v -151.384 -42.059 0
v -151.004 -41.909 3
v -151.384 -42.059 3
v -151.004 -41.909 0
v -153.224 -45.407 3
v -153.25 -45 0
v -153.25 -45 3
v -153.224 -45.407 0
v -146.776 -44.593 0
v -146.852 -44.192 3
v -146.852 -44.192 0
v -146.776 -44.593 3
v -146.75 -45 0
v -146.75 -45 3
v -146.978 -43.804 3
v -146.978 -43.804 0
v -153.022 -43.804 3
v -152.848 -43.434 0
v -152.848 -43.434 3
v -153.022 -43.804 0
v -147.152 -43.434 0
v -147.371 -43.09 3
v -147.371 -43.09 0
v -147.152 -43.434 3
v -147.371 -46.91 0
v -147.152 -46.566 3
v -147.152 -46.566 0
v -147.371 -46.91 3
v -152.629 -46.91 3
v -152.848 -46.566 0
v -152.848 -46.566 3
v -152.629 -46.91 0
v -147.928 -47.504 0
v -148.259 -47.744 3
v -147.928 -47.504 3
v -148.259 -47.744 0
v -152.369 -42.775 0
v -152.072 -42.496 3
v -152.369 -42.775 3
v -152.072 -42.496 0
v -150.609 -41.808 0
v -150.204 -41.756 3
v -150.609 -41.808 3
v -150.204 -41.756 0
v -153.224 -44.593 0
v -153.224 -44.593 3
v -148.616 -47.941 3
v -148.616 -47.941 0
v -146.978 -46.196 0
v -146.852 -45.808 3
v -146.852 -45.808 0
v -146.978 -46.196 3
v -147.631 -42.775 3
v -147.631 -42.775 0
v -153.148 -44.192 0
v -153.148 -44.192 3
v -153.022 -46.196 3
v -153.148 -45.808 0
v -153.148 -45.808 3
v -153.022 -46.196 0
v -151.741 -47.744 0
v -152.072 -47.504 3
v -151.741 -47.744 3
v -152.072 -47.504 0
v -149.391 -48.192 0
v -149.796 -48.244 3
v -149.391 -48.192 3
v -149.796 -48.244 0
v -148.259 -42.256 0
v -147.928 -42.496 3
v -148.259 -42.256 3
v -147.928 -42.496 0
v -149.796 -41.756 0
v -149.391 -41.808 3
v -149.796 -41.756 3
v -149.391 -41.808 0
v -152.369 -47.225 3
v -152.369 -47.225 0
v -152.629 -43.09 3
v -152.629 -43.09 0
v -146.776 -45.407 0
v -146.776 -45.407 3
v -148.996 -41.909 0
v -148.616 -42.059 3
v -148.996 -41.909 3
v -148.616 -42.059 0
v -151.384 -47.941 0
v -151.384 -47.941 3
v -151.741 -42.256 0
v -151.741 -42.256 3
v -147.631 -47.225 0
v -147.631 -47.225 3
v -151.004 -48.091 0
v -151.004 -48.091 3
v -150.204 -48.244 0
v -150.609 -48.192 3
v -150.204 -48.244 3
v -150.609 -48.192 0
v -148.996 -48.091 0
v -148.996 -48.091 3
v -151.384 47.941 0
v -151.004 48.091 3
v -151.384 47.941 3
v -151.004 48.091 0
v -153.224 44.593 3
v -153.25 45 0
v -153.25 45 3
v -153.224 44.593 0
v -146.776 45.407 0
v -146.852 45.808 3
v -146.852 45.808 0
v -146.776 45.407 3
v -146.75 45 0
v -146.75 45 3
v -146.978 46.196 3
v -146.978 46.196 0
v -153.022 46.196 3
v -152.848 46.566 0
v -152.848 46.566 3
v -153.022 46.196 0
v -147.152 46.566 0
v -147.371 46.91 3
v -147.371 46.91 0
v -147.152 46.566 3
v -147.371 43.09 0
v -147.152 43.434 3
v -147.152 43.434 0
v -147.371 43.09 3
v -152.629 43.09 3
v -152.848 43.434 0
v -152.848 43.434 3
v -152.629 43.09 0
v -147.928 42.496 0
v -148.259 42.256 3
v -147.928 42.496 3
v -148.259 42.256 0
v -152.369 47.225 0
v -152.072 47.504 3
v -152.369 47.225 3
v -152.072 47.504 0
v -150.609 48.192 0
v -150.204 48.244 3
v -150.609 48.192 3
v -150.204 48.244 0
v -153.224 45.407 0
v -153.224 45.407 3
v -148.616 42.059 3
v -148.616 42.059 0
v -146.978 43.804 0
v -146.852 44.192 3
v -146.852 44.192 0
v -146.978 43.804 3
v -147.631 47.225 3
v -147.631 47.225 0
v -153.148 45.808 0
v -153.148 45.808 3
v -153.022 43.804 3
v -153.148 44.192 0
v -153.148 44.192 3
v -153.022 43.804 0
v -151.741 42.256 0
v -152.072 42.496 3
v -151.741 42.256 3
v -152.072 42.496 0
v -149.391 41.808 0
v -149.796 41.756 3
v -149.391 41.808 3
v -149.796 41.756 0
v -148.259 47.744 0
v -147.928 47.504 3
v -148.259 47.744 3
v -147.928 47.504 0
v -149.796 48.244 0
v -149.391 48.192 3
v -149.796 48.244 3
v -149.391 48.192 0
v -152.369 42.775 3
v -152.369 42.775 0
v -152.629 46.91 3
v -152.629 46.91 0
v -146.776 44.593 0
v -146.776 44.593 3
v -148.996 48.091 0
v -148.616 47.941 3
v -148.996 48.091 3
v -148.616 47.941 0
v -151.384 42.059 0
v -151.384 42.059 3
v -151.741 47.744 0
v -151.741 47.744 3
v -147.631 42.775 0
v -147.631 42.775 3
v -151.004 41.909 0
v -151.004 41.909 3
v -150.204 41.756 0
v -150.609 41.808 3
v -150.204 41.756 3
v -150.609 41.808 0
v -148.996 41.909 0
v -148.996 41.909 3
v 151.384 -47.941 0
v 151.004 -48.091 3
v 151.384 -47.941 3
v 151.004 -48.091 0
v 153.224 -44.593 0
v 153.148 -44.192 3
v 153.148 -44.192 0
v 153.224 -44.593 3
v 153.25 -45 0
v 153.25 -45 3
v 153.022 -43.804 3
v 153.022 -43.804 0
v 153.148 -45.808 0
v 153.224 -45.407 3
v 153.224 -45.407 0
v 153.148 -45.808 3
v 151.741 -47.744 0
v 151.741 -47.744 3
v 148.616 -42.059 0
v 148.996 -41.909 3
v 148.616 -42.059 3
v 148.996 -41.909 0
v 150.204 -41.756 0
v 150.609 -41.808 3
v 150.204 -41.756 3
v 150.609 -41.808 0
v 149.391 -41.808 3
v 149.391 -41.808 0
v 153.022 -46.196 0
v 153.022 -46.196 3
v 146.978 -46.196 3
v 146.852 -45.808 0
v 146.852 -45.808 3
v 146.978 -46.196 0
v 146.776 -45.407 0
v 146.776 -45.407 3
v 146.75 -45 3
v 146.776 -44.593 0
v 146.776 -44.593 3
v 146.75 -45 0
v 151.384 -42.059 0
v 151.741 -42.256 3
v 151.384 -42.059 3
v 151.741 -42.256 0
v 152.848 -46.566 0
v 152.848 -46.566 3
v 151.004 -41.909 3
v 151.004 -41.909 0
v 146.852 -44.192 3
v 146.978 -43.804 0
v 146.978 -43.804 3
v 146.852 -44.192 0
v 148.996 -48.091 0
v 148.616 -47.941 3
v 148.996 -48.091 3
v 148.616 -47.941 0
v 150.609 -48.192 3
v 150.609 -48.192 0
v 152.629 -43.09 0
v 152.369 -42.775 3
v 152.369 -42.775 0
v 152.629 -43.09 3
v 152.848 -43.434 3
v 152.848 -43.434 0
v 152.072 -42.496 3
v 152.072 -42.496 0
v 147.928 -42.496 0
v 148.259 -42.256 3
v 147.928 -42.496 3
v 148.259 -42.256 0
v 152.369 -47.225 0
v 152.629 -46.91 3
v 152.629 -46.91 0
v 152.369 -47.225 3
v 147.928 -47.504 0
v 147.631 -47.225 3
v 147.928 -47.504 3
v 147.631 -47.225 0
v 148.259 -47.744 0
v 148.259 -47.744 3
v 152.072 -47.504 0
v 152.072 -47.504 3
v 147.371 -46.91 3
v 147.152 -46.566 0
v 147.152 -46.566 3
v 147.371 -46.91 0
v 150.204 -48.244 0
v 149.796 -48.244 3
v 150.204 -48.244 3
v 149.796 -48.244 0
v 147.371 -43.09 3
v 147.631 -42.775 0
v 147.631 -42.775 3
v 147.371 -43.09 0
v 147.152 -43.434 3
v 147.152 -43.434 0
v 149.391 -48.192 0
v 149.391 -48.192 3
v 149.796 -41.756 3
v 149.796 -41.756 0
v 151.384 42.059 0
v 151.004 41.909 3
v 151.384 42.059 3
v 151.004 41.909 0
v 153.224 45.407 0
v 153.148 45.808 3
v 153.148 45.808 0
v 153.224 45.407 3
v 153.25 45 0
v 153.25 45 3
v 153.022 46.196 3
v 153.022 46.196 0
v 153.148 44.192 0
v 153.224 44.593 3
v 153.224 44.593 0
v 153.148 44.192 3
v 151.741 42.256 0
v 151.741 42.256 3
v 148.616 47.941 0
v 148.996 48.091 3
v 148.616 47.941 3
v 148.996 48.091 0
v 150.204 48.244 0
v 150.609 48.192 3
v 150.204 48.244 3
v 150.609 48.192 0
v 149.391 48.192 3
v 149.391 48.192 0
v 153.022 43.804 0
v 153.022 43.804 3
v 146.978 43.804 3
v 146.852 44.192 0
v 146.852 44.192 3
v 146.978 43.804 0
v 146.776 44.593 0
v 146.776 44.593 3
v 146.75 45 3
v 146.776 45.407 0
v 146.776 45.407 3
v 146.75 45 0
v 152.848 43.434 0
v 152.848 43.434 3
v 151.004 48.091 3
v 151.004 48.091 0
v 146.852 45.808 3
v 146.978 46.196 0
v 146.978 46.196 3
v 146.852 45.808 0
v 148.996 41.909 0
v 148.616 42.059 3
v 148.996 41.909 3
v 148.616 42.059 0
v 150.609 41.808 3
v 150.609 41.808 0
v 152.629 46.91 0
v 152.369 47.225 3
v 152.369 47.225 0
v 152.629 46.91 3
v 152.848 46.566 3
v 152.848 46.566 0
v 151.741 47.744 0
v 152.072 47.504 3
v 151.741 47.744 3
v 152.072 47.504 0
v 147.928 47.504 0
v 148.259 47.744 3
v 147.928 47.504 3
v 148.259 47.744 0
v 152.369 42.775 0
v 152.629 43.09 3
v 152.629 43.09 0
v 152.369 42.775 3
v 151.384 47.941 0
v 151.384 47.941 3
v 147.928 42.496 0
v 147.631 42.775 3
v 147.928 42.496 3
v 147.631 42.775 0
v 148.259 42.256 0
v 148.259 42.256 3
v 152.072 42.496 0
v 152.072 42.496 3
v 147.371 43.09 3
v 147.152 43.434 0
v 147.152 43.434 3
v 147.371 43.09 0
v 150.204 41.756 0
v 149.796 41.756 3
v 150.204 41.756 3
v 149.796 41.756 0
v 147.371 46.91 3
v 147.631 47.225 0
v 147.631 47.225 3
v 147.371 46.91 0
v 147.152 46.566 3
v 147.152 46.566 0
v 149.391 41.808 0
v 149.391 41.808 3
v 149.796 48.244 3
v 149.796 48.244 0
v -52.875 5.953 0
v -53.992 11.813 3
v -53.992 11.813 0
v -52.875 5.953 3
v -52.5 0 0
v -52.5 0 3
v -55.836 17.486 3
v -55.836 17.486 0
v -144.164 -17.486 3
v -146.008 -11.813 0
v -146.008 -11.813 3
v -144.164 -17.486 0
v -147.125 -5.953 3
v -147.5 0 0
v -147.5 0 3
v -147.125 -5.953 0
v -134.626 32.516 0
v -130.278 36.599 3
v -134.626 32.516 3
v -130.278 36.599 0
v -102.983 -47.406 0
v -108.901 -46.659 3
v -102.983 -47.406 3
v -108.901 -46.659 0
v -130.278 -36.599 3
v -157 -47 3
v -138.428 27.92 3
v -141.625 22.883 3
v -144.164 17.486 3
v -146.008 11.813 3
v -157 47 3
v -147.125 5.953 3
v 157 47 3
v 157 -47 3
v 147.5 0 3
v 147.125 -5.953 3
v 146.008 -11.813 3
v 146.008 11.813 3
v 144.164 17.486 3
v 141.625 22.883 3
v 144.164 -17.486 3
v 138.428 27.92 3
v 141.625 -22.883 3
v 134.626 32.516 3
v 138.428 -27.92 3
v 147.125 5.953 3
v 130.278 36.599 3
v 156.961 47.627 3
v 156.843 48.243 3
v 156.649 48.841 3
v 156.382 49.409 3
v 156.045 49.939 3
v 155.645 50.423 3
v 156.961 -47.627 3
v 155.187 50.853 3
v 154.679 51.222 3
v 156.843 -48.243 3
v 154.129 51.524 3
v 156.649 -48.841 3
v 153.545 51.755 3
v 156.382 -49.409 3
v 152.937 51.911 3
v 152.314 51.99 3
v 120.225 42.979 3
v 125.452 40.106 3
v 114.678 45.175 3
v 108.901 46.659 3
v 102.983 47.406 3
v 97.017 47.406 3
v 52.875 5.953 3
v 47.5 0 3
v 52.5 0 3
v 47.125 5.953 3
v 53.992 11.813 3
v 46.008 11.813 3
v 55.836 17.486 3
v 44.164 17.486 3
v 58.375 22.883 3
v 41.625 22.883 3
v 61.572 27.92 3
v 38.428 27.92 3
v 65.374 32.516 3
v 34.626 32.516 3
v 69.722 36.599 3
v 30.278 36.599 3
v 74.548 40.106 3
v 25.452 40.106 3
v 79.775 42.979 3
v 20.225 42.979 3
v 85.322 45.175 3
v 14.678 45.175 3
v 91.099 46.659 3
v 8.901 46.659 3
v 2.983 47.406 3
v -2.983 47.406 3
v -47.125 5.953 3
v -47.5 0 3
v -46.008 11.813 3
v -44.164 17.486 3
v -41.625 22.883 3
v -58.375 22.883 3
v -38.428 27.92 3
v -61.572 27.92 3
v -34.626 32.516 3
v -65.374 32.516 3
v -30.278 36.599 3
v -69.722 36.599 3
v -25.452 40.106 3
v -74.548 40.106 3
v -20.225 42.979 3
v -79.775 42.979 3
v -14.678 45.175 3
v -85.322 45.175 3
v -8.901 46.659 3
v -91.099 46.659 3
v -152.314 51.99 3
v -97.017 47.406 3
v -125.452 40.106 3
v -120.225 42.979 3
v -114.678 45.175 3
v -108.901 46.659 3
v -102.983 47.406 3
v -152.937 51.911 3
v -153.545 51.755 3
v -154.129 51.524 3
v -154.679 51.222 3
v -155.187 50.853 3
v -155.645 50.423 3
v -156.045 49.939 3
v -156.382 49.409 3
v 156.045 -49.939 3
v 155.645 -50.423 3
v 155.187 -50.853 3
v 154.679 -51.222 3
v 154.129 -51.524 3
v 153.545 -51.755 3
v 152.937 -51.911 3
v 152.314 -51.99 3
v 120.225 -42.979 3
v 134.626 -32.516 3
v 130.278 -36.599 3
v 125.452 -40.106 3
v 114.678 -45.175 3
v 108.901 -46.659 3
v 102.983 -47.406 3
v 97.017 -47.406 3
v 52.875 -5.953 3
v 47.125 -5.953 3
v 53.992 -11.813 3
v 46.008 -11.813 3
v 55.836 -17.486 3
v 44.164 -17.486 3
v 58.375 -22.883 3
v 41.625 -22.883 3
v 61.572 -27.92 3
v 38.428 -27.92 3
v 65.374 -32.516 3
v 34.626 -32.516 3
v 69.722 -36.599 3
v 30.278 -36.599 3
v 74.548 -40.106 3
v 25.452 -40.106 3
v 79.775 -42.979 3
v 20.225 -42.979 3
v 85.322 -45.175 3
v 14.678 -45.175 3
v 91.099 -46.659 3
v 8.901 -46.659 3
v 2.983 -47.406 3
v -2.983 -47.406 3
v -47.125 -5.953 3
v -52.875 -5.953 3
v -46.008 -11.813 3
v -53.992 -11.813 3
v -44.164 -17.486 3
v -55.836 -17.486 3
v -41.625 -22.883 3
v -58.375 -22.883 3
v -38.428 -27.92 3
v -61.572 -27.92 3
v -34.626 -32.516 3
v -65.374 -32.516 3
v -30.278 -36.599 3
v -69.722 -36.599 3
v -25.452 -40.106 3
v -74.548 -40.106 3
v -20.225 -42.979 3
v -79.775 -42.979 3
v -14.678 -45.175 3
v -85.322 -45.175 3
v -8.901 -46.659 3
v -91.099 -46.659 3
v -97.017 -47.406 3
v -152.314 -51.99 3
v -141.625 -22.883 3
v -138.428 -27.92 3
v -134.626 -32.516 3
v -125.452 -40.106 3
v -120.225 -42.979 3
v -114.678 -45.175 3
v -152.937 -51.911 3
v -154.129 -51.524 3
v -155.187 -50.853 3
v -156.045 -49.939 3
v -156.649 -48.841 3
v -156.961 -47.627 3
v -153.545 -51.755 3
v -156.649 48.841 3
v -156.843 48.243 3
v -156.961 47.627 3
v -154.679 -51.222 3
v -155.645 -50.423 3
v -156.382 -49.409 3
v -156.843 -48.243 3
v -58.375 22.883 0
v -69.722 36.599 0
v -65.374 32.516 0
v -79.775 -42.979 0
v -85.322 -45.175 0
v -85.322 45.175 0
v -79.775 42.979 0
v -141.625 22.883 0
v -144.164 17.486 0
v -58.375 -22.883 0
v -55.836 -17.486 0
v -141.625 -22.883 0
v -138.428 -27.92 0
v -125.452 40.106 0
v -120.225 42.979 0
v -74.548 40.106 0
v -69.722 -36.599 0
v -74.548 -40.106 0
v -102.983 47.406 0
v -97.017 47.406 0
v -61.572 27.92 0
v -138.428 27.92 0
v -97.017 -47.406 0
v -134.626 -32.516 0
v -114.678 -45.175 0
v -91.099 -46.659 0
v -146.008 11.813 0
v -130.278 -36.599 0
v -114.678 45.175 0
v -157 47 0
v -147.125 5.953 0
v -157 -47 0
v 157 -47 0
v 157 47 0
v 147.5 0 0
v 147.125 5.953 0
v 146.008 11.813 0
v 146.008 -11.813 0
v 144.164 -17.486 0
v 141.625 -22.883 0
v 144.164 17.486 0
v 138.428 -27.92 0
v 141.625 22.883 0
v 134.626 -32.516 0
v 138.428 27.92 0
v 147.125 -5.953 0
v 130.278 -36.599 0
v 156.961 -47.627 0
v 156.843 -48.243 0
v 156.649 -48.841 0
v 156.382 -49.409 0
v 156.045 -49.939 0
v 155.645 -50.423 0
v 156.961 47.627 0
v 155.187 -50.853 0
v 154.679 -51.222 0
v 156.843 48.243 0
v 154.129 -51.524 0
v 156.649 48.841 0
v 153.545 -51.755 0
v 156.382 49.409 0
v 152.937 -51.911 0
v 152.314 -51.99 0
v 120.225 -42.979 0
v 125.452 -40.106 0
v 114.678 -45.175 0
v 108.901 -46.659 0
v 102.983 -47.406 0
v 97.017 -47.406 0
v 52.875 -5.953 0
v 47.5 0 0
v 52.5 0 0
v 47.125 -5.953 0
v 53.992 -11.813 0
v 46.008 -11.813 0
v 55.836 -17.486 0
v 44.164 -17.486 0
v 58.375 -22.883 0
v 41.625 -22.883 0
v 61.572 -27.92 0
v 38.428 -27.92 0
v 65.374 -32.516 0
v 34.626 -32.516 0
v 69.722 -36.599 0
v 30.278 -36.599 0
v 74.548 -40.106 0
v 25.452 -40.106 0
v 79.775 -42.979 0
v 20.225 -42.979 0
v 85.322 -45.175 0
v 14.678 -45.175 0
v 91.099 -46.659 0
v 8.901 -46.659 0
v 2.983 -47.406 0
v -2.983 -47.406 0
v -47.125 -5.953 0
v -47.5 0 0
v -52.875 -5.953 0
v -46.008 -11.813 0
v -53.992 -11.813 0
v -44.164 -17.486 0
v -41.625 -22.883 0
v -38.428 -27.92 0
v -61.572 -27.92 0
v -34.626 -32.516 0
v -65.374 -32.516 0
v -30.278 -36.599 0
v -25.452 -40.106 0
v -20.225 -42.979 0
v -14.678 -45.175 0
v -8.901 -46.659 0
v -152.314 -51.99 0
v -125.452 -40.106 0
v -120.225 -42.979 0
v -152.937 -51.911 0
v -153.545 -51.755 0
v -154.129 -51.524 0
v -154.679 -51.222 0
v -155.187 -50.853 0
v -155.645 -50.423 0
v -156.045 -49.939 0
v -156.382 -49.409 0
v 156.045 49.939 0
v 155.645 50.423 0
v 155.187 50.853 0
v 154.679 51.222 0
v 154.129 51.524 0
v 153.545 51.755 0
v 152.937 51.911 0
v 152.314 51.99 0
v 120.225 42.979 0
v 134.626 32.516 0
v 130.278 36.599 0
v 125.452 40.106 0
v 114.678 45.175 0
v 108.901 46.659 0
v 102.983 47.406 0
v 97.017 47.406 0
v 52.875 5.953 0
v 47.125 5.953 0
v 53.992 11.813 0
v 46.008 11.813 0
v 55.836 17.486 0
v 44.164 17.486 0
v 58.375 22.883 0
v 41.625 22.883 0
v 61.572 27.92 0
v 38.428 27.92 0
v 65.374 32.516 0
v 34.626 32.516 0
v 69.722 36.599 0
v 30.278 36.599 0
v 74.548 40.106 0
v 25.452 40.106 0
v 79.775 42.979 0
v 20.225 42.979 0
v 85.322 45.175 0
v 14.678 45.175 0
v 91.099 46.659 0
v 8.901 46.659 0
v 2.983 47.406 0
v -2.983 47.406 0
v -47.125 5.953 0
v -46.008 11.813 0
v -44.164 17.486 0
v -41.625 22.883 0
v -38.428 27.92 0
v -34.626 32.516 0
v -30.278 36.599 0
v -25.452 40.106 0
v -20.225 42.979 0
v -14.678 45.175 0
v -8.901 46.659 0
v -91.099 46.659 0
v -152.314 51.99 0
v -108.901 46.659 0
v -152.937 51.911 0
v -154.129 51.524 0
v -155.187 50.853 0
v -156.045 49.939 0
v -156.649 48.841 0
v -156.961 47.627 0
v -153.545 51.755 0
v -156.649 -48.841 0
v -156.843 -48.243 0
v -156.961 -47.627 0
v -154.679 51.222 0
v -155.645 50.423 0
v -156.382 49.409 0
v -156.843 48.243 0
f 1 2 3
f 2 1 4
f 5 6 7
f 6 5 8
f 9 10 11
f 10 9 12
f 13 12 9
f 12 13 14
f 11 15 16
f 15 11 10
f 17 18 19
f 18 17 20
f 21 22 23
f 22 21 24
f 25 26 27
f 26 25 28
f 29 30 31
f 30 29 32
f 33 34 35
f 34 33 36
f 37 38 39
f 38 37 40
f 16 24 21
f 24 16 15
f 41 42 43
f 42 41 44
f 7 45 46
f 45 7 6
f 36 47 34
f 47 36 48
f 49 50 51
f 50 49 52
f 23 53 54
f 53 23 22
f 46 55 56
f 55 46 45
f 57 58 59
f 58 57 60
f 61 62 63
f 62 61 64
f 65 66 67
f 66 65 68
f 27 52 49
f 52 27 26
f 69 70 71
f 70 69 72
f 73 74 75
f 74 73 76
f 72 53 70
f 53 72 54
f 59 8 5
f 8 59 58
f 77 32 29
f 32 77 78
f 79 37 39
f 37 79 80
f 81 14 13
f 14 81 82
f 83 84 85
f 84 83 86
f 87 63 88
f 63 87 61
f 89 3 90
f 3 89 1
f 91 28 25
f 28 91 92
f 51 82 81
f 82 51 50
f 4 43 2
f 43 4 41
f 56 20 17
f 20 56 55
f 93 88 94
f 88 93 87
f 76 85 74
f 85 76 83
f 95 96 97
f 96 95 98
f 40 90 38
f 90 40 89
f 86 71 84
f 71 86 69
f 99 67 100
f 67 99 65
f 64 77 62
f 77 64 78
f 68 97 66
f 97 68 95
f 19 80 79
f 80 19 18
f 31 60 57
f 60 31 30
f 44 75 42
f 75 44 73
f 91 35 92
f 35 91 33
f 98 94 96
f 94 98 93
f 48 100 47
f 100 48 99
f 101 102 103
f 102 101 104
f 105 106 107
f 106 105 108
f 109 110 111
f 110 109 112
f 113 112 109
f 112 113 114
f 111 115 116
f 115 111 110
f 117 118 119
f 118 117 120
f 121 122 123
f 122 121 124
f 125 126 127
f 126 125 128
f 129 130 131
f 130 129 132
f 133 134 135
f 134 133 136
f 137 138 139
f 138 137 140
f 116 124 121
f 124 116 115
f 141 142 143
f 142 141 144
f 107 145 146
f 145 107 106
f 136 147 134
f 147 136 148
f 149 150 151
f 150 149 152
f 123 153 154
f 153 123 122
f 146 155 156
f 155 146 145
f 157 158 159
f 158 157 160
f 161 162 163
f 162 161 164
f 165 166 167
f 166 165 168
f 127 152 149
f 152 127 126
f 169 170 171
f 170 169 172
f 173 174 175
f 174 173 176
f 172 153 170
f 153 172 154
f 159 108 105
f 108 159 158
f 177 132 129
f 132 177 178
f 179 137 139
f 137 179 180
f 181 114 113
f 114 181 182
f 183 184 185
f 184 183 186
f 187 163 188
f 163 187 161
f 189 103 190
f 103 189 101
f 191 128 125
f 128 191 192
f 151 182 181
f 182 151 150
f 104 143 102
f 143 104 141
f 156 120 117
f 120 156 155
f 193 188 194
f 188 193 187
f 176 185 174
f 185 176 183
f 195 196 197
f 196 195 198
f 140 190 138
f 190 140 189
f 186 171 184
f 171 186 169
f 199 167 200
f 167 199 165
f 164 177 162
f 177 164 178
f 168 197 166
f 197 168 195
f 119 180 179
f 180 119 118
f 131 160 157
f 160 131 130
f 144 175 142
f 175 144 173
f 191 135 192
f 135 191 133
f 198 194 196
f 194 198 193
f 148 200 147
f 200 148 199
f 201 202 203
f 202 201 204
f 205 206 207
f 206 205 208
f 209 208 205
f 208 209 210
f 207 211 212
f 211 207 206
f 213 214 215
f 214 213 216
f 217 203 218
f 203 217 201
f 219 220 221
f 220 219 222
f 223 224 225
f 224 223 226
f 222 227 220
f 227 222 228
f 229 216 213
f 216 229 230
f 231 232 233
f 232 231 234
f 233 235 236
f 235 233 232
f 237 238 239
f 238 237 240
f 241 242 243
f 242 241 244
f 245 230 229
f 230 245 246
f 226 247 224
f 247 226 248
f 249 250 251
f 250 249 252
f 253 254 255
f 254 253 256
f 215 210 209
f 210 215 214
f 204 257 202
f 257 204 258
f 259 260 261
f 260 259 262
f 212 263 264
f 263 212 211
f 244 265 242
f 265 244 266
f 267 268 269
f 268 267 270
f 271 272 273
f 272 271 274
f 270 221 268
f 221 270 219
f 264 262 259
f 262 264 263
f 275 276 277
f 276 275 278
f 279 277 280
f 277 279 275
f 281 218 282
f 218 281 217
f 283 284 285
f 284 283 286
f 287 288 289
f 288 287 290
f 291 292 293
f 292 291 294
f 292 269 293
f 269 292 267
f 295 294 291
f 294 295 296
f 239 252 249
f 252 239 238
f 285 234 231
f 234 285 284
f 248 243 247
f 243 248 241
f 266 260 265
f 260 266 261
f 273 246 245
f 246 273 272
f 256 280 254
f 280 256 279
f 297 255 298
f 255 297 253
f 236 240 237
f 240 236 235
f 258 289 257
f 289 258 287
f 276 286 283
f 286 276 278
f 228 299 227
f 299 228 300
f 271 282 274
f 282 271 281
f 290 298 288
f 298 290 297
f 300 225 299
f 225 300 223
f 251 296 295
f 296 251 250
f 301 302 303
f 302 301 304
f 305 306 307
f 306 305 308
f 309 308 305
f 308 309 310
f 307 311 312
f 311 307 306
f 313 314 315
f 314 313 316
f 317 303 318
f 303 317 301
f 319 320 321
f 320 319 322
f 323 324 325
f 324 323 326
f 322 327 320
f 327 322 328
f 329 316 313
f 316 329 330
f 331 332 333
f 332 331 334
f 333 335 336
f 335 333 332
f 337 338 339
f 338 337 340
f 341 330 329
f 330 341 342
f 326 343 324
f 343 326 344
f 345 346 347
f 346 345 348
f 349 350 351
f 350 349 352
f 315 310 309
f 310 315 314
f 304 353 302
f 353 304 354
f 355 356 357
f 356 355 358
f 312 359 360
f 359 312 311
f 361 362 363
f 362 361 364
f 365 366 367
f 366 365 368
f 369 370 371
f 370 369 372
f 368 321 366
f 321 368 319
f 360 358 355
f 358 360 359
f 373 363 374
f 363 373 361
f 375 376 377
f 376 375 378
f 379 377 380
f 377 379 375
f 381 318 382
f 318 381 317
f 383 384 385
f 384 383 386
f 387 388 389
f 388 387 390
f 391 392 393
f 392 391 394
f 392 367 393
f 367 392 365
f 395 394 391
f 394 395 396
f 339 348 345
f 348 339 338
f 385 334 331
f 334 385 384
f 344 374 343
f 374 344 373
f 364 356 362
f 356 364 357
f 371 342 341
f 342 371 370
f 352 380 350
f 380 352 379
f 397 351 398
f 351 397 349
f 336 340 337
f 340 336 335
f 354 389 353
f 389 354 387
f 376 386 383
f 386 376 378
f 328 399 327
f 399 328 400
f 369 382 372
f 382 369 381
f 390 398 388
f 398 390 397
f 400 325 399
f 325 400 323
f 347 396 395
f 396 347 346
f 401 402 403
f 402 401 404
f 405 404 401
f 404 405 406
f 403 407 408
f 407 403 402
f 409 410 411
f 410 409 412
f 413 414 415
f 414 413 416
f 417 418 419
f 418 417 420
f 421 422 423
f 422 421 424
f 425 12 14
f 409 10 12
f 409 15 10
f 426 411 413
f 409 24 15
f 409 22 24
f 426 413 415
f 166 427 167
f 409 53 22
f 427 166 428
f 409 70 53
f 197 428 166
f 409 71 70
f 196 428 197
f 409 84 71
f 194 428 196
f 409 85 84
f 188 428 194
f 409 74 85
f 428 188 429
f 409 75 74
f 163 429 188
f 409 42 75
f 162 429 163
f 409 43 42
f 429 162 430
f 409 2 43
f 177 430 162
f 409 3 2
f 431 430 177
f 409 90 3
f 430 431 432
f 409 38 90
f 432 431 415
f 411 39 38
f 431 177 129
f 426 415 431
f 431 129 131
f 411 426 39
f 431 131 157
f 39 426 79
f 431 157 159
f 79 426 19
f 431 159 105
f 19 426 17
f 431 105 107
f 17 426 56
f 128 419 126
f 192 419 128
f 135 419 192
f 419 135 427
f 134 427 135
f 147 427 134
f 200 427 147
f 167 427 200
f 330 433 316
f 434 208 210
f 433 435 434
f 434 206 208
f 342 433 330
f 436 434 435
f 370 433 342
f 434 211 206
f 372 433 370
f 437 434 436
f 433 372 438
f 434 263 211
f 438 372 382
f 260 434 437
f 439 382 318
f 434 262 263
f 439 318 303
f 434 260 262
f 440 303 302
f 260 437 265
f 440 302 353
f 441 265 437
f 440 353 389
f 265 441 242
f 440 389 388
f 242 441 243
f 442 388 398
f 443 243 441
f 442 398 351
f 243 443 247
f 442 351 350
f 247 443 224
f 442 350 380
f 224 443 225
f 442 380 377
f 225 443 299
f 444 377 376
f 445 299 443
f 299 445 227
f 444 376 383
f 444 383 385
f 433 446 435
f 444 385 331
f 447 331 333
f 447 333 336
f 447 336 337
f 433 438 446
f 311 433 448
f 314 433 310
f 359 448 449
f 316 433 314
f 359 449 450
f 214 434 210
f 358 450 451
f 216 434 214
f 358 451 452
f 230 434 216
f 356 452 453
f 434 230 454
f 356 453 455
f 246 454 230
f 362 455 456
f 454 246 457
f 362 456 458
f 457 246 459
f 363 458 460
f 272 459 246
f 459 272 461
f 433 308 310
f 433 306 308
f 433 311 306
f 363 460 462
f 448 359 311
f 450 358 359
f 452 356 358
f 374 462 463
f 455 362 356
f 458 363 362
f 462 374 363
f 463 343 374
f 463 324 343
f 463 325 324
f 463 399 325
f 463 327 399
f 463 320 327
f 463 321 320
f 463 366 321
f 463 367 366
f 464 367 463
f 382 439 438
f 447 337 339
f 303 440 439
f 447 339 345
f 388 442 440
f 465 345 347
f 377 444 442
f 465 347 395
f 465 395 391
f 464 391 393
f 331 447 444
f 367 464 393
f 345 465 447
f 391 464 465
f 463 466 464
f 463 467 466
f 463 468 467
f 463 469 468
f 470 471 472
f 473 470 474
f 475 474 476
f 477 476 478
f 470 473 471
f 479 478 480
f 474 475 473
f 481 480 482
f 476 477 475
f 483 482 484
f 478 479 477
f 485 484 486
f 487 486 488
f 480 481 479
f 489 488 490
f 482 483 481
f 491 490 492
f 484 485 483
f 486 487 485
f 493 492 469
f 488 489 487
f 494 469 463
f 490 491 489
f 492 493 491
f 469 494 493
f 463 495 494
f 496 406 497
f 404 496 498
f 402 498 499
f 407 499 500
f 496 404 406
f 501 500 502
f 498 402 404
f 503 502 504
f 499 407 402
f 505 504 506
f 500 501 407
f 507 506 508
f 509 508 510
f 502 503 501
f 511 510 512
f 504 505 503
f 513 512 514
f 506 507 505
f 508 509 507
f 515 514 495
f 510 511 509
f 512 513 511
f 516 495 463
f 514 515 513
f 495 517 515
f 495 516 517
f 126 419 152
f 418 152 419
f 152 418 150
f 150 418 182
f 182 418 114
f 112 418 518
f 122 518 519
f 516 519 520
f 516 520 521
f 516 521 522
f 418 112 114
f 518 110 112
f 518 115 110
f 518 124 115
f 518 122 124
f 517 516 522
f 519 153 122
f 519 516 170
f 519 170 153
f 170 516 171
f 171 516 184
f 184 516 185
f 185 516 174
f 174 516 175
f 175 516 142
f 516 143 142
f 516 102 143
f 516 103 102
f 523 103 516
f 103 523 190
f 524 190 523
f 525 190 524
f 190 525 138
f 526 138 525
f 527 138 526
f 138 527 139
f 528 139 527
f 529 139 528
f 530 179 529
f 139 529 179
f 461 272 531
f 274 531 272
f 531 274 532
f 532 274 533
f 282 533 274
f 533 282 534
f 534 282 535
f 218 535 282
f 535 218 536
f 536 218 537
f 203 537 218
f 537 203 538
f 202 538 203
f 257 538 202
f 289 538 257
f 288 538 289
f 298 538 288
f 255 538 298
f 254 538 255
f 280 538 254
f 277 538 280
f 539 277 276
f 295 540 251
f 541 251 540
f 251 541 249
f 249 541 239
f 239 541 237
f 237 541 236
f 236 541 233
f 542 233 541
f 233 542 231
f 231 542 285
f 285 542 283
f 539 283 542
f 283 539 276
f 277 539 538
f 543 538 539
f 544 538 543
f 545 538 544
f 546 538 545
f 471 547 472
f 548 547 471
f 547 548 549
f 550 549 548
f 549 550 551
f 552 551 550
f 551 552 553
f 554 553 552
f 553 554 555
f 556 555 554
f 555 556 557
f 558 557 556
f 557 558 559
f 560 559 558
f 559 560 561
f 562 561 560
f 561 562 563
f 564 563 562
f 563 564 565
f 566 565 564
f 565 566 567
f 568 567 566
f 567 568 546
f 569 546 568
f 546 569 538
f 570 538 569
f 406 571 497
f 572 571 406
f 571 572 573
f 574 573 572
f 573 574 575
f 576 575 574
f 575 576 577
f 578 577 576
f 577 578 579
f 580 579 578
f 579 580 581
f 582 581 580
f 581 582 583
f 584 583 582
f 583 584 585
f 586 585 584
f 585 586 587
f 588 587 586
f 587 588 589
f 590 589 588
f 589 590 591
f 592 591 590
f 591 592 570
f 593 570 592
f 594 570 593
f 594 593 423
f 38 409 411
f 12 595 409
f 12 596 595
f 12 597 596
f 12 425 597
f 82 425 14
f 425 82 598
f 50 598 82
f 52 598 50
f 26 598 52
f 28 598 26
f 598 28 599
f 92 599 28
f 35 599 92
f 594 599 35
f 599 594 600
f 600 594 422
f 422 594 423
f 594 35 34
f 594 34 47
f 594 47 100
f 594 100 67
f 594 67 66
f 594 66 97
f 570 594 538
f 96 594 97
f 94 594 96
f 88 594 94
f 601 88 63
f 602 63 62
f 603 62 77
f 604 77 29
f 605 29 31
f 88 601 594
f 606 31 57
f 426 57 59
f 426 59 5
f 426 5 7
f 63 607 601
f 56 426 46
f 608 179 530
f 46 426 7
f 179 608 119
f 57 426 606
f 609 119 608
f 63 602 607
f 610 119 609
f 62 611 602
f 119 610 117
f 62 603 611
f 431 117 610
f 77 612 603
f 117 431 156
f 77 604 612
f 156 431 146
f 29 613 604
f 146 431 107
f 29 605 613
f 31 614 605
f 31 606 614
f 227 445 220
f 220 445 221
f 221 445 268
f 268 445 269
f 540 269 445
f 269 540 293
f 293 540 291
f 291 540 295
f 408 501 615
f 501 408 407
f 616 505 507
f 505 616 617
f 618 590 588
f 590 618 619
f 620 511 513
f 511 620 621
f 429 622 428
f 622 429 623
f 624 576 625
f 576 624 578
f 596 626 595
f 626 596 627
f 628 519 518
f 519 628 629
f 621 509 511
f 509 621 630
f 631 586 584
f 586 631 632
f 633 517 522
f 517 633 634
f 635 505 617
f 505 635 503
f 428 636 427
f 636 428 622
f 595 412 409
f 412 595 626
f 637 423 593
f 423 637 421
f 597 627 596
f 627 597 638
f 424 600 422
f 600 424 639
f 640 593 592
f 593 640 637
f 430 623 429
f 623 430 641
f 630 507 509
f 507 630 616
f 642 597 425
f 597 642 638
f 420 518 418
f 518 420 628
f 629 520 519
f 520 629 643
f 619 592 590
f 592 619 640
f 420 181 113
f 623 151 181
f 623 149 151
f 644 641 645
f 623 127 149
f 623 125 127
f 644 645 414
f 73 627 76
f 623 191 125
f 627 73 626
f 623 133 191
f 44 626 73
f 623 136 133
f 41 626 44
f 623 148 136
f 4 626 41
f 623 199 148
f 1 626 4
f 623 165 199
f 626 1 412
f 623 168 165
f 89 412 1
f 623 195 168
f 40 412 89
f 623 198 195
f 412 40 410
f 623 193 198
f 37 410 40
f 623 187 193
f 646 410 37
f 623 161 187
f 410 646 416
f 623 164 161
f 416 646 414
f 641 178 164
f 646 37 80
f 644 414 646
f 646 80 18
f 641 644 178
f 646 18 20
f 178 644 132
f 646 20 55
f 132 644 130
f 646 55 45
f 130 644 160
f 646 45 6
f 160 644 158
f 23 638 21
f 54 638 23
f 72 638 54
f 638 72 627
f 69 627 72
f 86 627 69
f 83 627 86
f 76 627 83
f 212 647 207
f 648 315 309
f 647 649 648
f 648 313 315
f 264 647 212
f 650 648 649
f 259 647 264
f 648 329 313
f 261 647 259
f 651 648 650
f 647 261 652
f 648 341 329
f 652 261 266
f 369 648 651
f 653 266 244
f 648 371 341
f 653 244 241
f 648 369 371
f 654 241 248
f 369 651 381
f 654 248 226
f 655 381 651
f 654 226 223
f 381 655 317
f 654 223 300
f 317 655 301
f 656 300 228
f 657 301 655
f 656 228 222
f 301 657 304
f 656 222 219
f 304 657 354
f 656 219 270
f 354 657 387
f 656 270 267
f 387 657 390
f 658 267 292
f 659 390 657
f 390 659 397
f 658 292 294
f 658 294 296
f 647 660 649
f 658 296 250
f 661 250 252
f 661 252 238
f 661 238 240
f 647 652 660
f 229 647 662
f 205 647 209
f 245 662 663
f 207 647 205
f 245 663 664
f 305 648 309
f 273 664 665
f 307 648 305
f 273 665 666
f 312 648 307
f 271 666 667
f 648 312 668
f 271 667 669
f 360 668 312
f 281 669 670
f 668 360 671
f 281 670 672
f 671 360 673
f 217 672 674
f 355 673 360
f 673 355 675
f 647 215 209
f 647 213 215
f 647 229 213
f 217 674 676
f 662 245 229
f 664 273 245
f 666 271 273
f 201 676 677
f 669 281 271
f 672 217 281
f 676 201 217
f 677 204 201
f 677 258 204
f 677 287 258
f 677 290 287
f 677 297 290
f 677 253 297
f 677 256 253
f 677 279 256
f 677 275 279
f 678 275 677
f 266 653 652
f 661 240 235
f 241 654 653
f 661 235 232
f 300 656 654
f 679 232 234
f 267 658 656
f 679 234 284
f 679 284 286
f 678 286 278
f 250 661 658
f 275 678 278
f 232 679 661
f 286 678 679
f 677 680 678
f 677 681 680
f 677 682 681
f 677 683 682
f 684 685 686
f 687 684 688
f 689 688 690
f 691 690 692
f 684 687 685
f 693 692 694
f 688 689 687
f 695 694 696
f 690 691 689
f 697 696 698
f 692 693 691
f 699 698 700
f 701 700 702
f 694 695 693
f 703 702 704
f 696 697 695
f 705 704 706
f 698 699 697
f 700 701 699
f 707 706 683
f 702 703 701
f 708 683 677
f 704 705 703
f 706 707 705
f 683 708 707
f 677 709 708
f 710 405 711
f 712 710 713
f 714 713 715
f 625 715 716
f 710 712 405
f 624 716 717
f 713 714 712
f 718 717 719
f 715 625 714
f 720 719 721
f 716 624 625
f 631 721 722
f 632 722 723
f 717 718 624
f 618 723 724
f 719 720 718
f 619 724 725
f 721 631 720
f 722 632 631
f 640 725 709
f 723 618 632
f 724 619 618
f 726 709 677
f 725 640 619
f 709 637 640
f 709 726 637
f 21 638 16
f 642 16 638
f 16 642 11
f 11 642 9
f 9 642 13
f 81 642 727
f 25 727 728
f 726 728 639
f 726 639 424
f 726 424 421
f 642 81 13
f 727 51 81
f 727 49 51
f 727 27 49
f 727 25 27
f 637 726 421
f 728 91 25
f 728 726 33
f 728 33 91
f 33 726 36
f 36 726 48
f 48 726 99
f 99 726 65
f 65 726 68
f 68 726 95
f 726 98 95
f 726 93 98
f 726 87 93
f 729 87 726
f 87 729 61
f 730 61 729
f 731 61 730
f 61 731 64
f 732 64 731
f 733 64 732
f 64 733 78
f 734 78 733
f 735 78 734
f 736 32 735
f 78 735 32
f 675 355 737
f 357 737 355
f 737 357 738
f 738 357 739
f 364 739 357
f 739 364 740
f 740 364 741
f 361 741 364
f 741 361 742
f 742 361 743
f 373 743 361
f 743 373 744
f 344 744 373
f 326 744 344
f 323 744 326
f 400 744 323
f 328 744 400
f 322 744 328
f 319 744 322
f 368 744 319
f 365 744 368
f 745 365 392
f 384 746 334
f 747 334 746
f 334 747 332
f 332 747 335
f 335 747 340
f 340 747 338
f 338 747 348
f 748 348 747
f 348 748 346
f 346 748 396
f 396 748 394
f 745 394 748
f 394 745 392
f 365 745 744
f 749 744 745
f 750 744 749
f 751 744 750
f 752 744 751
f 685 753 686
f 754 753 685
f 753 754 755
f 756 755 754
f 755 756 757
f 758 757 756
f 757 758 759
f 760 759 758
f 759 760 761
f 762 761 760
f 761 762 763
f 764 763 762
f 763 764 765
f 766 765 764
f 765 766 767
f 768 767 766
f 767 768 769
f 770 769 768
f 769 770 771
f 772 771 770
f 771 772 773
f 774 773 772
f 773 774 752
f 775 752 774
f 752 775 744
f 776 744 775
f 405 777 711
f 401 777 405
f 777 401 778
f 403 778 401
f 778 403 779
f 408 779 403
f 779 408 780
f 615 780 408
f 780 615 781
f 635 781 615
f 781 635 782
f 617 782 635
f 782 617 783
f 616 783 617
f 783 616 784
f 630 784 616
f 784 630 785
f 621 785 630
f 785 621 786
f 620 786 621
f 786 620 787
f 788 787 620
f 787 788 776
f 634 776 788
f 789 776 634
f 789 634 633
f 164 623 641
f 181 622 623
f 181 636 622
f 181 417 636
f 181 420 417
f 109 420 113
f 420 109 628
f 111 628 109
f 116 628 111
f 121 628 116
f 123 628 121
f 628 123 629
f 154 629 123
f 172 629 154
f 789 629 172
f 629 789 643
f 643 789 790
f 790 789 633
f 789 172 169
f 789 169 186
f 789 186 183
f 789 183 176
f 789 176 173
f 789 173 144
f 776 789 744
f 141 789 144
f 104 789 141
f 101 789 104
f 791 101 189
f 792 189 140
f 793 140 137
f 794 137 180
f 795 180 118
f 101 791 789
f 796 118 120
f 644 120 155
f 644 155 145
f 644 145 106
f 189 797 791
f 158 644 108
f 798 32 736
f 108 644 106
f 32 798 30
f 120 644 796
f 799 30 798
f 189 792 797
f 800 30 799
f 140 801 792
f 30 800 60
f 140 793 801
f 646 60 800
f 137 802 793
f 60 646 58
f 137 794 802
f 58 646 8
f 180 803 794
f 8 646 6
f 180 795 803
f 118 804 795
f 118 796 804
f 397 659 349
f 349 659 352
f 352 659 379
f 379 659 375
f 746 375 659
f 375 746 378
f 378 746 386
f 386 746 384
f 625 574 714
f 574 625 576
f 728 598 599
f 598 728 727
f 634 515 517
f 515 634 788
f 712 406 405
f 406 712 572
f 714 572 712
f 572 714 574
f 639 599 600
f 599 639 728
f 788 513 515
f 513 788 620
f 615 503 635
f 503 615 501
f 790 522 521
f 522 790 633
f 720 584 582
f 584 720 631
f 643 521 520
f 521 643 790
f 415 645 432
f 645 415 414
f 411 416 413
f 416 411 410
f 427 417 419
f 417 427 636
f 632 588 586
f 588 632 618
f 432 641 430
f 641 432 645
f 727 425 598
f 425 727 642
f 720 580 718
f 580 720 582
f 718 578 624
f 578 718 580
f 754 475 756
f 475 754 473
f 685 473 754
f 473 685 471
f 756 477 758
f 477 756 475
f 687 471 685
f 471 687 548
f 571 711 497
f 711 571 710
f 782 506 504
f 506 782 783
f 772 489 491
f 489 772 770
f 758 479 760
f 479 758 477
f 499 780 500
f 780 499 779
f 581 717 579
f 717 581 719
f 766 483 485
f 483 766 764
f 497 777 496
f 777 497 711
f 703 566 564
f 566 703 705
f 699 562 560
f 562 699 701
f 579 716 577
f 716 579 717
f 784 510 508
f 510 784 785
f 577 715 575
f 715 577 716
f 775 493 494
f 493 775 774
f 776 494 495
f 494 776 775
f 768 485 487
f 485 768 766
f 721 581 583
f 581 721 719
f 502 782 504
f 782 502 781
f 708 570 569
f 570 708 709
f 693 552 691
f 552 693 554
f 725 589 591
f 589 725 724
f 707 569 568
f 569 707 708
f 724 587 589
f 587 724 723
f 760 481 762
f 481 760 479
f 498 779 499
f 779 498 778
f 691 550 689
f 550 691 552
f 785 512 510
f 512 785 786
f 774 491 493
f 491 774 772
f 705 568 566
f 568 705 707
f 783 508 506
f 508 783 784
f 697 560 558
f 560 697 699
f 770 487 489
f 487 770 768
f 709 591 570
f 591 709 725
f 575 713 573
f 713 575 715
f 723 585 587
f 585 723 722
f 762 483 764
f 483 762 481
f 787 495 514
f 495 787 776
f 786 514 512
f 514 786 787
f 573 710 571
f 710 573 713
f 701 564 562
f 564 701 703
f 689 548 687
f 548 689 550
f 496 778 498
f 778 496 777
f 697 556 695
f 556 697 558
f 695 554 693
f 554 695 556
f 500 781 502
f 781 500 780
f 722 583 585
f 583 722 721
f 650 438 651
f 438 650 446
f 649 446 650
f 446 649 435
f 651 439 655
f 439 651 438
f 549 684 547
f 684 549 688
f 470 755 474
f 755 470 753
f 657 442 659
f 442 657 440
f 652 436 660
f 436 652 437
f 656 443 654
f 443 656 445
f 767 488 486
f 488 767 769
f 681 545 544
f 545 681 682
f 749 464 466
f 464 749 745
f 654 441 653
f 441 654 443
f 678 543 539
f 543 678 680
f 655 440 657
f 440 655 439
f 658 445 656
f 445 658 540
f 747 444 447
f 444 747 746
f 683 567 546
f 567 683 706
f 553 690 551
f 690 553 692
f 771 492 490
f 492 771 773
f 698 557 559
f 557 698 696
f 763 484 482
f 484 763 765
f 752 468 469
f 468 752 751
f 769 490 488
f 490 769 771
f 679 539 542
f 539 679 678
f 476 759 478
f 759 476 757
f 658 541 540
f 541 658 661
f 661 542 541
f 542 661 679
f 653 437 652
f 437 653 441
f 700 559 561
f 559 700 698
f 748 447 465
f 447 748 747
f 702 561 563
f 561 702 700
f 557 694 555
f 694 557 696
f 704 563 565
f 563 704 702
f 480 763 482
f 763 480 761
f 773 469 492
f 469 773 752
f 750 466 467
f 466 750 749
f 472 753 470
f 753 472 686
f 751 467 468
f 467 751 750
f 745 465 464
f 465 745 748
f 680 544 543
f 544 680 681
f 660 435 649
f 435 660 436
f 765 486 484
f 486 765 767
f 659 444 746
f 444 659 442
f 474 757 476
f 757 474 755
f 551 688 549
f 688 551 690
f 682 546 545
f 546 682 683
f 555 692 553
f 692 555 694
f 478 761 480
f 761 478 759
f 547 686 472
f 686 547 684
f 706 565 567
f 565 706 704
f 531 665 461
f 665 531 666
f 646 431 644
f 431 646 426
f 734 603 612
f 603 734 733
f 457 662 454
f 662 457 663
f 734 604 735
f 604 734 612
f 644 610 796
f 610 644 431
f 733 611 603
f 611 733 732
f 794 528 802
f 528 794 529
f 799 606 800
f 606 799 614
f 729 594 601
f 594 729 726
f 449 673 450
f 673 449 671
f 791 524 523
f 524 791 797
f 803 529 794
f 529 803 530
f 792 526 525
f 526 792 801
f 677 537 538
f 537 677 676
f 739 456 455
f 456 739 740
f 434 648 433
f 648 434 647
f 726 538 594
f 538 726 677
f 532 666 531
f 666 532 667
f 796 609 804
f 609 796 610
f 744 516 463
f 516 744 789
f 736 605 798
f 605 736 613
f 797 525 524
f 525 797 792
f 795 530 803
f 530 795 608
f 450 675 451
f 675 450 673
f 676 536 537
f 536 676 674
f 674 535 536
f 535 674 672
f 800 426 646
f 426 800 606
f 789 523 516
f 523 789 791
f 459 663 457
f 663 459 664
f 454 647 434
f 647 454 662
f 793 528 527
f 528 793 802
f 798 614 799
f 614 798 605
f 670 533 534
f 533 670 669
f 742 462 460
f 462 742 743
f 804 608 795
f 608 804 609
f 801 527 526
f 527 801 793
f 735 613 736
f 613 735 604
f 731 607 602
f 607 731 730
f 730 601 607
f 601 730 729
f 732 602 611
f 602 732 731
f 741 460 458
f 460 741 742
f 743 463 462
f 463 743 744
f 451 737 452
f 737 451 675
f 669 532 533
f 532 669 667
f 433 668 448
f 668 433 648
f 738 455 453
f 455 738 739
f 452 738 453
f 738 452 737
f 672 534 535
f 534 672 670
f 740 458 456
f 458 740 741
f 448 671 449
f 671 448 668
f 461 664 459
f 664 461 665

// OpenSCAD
$fn = 50;

difference() {
	union() {
		hull() {
			translate(v = [-152.0, 47.0, 0]) {
				cylinder(h = 3, r = 5);
			}
			translate(v = [152.0, 47.0, 0]) {
				cylinder(h = 3, r = 5);
			}
			translate(v = [-152.0, -47.0, 0]) {
				cylinder(h = 3, r = 5);
			}
			translate(v = [152.0, -47.0, 0]) {
				cylinder(h = 3, r = 5);
			}
		}
	}
	union() {
		translate(v = [-150.0, -45.0, -100.0]) {
			cylinder(h = 200, r = 3.25);
		}
		translate(v = [-150.0, 45.0, -100.0]) {
			cylinder(h = 200, r = 3.25);
		}
		translate(v = [150.0, -45.0, -100.0]) {
			cylinder(h = 200, r = 3.25);
		}
		translate(v = [150.0, 45.0, -100.0]) {
			cylinder(h = 200, r = 3.25);
		}
		translate(v = [-150.0, -45.0, -100.0]) {
			cylinder(h = 200, r = 1.8);
		}
		translate(v = [-150.0, 45.0, -100.0]) {
			cylinder(h = 200, r = 1.8);
		}
		translate(v = [150.0, -45.0, -100.0]) {
			cylinder(h = 200, r = 1.8);
		}
		translate(v = [150.0, 45.0, -100.0]) {
			cylinder(h = 200, r = 1.8);
		}
		translate(v = [-100.0, 0, 0.0]) {
			cylinder(h = 3, r = 47.5);
		}
		cylinder(h = 3, r = 47.5);
		translate(v = [100.0, 0, 0.0]) {
			cylinder(h = 3, r = 47.5);
		}
	}
}
